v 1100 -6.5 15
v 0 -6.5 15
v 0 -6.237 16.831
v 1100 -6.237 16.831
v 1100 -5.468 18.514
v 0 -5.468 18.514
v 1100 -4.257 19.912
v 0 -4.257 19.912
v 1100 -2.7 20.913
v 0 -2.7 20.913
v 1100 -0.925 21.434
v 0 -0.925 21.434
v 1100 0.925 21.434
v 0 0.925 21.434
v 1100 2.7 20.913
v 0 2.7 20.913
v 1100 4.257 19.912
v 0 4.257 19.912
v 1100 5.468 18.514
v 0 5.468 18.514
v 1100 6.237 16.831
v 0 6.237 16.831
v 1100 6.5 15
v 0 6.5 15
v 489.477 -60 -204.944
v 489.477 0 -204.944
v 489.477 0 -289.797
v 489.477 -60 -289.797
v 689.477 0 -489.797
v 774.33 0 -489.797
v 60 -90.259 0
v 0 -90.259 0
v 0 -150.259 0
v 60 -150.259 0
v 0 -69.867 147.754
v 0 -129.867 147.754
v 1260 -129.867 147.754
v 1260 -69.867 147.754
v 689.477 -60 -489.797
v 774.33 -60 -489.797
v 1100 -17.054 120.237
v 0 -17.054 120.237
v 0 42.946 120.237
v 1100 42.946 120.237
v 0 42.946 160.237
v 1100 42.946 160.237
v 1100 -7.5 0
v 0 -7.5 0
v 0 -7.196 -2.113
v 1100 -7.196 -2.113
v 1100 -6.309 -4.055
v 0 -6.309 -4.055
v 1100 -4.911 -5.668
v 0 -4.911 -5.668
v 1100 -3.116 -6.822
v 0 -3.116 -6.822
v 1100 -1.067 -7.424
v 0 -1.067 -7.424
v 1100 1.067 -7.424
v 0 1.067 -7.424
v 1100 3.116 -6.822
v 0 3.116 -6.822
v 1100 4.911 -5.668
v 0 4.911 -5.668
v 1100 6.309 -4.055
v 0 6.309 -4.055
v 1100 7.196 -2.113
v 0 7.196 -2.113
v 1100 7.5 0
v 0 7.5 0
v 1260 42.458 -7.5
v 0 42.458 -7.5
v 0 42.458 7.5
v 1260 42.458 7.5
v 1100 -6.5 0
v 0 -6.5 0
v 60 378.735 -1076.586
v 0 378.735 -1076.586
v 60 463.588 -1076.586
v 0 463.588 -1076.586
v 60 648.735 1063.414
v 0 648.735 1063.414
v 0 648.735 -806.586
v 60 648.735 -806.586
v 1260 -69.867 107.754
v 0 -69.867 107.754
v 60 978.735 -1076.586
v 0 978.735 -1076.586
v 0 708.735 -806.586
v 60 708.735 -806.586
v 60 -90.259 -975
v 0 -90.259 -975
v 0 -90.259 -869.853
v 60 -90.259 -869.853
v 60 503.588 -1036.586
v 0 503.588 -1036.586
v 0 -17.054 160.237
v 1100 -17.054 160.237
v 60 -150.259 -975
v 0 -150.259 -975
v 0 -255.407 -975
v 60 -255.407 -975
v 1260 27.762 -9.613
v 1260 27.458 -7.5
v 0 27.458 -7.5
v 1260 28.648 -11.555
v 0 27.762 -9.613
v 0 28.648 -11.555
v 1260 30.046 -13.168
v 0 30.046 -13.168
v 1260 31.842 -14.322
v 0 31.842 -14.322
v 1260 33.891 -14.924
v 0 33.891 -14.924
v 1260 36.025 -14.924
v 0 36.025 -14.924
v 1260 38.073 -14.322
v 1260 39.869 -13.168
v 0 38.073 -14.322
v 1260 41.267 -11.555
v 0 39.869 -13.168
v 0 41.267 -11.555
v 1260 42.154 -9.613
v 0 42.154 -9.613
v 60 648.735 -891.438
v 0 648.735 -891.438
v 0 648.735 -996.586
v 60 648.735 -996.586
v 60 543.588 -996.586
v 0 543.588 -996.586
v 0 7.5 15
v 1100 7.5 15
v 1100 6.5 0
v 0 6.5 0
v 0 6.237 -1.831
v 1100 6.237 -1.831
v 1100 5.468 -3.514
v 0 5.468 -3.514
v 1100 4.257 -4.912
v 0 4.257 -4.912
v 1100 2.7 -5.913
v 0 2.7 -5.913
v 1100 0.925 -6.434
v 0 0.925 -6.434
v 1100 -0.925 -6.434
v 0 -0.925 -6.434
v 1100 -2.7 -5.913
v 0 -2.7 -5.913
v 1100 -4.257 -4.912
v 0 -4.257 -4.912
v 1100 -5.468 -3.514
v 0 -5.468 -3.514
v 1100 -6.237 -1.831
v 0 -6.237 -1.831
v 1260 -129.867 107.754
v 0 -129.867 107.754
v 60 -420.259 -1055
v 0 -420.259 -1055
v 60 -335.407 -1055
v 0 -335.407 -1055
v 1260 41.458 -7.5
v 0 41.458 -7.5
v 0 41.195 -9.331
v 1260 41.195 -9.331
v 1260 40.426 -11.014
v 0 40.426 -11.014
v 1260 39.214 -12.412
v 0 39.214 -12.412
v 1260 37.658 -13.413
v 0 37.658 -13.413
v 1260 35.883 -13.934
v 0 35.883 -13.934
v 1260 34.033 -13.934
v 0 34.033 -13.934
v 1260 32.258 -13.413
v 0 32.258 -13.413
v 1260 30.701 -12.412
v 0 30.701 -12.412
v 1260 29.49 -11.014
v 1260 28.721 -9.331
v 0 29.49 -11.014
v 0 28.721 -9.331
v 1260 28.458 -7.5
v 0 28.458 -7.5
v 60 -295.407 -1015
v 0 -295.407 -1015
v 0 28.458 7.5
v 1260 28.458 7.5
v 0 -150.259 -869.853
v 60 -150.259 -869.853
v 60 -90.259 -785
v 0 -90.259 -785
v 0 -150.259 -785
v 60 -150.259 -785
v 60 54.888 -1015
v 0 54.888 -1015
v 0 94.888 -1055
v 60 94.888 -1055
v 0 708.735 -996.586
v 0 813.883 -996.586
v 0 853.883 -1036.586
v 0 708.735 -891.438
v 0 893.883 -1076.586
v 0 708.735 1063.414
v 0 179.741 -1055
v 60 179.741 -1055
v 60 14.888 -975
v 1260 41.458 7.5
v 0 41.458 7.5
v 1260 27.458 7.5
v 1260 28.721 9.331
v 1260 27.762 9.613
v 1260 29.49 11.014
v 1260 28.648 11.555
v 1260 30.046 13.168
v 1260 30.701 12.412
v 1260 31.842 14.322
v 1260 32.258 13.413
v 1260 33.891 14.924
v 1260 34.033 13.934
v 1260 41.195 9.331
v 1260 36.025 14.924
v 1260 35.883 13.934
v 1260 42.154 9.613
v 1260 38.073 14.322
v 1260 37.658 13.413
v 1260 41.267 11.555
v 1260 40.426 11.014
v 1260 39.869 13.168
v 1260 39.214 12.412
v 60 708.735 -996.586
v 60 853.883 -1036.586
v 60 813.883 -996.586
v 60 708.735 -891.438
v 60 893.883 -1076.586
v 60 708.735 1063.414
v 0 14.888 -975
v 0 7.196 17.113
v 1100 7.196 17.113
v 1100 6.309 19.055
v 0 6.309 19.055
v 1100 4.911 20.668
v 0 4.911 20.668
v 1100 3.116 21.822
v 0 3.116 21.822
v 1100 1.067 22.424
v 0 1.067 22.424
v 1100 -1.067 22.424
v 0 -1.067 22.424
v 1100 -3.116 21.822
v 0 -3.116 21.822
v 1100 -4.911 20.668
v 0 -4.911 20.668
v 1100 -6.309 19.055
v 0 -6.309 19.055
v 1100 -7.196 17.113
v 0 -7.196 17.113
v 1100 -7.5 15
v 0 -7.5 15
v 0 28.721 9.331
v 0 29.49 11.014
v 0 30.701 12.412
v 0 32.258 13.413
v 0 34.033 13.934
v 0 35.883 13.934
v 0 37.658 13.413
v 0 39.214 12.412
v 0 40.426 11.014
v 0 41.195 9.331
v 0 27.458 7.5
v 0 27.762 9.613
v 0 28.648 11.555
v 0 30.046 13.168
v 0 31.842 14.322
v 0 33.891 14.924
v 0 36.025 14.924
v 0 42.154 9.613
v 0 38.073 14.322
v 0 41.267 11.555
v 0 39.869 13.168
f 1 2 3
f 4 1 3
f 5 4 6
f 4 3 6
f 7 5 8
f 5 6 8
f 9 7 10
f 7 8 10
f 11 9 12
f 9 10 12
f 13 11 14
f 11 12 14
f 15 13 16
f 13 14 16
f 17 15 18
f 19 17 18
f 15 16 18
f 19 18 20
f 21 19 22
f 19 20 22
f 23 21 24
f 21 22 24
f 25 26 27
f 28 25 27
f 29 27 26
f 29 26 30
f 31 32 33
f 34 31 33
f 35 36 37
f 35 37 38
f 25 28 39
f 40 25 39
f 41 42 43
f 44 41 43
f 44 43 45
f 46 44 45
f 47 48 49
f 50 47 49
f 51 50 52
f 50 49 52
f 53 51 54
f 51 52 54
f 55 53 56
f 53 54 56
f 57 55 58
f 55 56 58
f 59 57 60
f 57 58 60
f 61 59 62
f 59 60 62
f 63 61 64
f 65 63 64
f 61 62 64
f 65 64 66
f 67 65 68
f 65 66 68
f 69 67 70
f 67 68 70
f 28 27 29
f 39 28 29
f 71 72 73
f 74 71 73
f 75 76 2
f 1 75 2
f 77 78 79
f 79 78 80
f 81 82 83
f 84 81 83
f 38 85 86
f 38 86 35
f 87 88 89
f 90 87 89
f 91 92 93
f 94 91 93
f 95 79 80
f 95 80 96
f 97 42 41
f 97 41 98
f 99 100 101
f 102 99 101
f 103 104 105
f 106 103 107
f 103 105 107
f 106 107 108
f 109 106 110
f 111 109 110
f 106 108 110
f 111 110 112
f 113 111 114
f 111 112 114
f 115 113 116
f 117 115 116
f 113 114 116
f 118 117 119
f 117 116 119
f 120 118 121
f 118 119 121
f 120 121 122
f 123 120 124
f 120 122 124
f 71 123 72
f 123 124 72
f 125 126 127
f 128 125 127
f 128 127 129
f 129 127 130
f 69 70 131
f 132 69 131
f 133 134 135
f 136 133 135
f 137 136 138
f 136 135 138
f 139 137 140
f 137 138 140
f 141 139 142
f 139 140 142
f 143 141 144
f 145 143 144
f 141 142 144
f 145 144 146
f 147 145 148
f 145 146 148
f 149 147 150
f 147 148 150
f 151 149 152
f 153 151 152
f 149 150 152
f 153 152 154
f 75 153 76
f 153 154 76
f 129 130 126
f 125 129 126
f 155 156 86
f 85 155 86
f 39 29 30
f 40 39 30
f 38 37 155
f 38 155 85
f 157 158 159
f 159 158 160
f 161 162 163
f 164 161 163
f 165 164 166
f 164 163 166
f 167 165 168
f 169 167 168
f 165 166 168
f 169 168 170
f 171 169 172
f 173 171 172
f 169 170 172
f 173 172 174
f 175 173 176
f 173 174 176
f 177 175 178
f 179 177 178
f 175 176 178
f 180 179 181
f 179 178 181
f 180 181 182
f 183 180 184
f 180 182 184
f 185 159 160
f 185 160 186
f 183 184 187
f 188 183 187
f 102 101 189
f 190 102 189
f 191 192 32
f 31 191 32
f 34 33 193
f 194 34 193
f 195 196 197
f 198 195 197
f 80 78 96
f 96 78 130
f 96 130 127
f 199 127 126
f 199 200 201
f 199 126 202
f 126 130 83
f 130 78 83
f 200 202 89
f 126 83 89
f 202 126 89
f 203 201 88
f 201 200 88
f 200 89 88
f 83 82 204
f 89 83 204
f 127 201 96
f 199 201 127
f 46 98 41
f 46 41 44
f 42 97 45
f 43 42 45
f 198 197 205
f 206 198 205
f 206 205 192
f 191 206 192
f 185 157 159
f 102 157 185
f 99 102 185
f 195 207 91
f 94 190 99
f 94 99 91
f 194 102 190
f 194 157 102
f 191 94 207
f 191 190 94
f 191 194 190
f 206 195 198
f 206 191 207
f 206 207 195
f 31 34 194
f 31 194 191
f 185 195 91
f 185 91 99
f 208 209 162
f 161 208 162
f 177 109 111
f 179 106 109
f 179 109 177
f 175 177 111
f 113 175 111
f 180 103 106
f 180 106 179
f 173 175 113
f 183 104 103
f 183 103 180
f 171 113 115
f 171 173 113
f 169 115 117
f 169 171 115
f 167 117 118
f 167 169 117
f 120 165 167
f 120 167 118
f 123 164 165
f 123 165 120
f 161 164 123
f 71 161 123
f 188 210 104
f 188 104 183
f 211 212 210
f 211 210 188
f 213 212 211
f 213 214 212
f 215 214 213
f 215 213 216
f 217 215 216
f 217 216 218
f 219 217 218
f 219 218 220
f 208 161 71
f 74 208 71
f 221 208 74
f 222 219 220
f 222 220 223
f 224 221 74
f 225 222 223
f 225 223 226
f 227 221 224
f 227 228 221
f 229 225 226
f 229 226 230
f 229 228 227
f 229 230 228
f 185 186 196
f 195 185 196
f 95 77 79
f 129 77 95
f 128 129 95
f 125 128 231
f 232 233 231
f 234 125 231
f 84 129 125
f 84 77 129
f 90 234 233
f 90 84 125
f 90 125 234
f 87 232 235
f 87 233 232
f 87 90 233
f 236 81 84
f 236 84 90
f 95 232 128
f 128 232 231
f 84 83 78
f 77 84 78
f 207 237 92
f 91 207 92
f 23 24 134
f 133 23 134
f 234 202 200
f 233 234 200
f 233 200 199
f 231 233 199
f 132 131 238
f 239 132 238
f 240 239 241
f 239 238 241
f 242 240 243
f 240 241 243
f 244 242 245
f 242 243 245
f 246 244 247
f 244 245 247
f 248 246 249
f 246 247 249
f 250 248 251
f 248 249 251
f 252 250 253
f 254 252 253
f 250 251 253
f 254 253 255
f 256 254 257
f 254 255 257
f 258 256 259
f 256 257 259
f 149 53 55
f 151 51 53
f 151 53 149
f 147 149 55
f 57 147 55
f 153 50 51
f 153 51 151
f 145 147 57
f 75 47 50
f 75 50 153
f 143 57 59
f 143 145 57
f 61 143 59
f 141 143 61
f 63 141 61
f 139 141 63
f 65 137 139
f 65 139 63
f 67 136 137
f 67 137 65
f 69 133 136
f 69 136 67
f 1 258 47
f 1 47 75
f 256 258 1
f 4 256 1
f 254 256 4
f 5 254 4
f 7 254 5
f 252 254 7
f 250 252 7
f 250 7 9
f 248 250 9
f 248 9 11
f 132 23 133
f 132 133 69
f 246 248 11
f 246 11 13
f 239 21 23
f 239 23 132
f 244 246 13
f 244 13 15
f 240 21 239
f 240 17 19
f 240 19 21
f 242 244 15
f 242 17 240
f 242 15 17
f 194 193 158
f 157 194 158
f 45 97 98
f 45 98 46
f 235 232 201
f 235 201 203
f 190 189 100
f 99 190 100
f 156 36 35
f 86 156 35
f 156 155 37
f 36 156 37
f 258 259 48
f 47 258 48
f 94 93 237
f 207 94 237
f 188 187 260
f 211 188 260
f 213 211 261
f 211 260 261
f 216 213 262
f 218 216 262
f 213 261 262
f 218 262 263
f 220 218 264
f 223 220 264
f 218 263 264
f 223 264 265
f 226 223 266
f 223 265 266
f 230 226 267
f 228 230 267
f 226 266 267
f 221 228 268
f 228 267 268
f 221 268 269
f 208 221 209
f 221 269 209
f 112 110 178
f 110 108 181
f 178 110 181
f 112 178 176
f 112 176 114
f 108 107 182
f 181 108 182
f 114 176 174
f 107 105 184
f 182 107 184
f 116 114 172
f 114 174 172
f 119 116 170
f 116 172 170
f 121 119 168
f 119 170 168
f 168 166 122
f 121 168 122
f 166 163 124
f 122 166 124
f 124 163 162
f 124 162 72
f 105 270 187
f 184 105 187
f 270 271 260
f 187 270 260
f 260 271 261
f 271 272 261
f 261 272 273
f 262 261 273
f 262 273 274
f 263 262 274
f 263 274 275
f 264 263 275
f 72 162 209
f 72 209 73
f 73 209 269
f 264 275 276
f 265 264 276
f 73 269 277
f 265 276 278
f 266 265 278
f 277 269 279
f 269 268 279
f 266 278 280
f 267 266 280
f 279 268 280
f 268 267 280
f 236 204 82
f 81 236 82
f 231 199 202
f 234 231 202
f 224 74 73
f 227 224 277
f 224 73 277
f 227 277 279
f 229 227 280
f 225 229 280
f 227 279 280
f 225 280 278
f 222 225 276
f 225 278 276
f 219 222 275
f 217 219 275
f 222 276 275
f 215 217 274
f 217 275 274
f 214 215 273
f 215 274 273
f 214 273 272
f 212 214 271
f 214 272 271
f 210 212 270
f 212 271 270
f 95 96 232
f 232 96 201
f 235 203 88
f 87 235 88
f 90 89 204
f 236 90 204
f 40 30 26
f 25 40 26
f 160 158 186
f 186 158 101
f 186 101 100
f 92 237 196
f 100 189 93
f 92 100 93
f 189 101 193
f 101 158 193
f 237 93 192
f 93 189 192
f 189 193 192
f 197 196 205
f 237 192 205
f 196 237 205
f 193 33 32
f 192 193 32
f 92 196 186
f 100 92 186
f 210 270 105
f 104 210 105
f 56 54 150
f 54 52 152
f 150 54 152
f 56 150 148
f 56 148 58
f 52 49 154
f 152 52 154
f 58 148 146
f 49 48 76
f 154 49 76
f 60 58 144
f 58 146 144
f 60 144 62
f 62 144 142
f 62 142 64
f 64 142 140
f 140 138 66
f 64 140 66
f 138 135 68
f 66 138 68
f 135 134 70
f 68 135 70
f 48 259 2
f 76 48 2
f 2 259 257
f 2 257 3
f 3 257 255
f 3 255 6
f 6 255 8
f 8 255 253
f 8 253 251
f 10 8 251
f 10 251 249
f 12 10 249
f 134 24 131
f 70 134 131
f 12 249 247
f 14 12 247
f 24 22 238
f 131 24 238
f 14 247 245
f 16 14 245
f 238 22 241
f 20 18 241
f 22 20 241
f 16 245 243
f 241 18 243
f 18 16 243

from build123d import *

# Parameters (mm, degrees)
F1_DEPTH  = 1100
F4_DEPTH  = 60
F6_DEPTH  = 1260
F7_W      = 60
F7_H      = 40
F9_DEPTH  = 1100
F8_W      = 60
F8_H      = 40
F10_DEPTH = 1260
F12_DEPTH = 60


with BuildPart() as f1:
    # F0 (on Right) → F1 (new body)
    with BuildSketch(Plane.YZ):
        with BuildLine():
            Line((-7.5, 15), (-7.5, 0))
            ThreePointArc((-7.5, 0), (0, -7.5), (7.5, 0))
            Line((7.5, 0), (7.5, 15))
            ThreePointArc((7.5, 15), (0, 22.5), (-7.5, 15))
        make_face()
        with BuildLine():
            ThreePointArc((6.5, 0), (0, -6.5), (-6.5, 0))
            Line((-6.5, 0), (-6.5, 15))
            ThreePointArc((-6.5, 15), (0, 21.5), (6.5, 15))
            Line((6.5, 15), (6.5, 0))
        make_face(mode=Mode.SUBTRACT)
    extrude(amount=F1_DEPTH)


with BuildPart() as f4:
    # F2 (on Right) + F3 (on Right) → F4 (new body)
    with BuildSketch(Plane.YZ):
        Polygon((-90.259336, -785), (-90.259336, 0), (-150.259336, 0), (-150.259336, -785), (-420.259336, -1055), (-335.406522, -1055), (-295.406522, -1015), (54.88785, -1015), (94.88785, -1055), (179.740664, -1055), align=None)
        Polygon((-255.406522, -975), (-150.259336, -869.852814), (-150.259336, -975), align=None, mode=Mode.SUBTRACT)
        Polygon((-90.259336, -975), (-90.259336, -869.852814), (14.88785, -975), align=None, mode=Mode.SUBTRACT)
    with BuildSketch(Plane.YZ):
        Polygon((708.7354, -806.585632), (708.7354, -21.585632), (708.7354, 1063.414368), (648.7354, 1063.414368), (648.7354, -21.585632), (648.7354, -806.585632), (378.7354, -1076.585632), (463.588213, -1076.585632), (503.588213, -1036.585632), (853.882586, -1036.585632), (893.882586, -1076.585632), (978.7354, -1076.585632), align=None)
        Polygon((543.588213, -996.585632), (648.7354, -891.438446), (648.7354, -996.585632), align=None, mode=Mode.SUBTRACT)
        Polygon((708.7354, -996.585632), (708.7354, -891.438446), (813.882586, -996.585632), align=None, mode=Mode.SUBTRACT)
    extrude(amount=F4_DEPTH)


with BuildPart() as f6:
    # F5 (on Right) → F6 (new body)
    with BuildSketch(Plane.YZ):
        with BuildLine():
            Line((27.457878, 7.5), (27.457878, -7.5))
            ThreePointArc((27.457878, -7.5), (34.957878, -15), (42.457878, -7.5))
            Line((42.457878, -7.5), (42.457878, 7.5))
            ThreePointArc((42.457878, 7.5), (34.957878, 15), (27.457878, 7.5))
        make_face()
        with BuildLine():
            ThreePointArc((41.457878, -7.5), (34.957878, -14), (28.457878, -7.5))
            Line((28.457878, -7.5), (28.457878, 7.5))
            ThreePointArc((28.457878, 7.5), (34.957878, 14), (41.457878, 7.5))
            Line((41.457878, 7.5), (41.457878, -7.5))
        make_face(mode=Mode.SUBTRACT)
    extrude(amount=F6_DEPTH)


with BuildPart() as f9:
    # F7 (on Right) → F9 (new body)
    with BuildSketch(Plane.YZ):
        with Locations((12.94594, 140.236716)):
            Rectangle(F7_W, F7_H)
    extrude(amount=F9_DEPTH)


with BuildPart() as f10:
    # F8 (on Right) → F10 (new body)
    with BuildSketch(Plane.YZ):
        with Locations((-99.866573, 127.754258)):
            Rectangle(F8_W, F8_H)
    extrude(amount=F10_DEPTH)


with BuildPart() as f12:
    # F11 (on Front) → F12 (new body)
    with BuildSketch(Plane.XZ):
        Polygon((774.330263, -489.796865), (489.477449, -204.944052), (489.477449, -289.796865), (689.477449, -489.796865), align=None)
    extrude(amount=F12_DEPTH)


solid = Compound([f1.part, f4.part, f6.part, f9.part, f10.part, f12.part])
